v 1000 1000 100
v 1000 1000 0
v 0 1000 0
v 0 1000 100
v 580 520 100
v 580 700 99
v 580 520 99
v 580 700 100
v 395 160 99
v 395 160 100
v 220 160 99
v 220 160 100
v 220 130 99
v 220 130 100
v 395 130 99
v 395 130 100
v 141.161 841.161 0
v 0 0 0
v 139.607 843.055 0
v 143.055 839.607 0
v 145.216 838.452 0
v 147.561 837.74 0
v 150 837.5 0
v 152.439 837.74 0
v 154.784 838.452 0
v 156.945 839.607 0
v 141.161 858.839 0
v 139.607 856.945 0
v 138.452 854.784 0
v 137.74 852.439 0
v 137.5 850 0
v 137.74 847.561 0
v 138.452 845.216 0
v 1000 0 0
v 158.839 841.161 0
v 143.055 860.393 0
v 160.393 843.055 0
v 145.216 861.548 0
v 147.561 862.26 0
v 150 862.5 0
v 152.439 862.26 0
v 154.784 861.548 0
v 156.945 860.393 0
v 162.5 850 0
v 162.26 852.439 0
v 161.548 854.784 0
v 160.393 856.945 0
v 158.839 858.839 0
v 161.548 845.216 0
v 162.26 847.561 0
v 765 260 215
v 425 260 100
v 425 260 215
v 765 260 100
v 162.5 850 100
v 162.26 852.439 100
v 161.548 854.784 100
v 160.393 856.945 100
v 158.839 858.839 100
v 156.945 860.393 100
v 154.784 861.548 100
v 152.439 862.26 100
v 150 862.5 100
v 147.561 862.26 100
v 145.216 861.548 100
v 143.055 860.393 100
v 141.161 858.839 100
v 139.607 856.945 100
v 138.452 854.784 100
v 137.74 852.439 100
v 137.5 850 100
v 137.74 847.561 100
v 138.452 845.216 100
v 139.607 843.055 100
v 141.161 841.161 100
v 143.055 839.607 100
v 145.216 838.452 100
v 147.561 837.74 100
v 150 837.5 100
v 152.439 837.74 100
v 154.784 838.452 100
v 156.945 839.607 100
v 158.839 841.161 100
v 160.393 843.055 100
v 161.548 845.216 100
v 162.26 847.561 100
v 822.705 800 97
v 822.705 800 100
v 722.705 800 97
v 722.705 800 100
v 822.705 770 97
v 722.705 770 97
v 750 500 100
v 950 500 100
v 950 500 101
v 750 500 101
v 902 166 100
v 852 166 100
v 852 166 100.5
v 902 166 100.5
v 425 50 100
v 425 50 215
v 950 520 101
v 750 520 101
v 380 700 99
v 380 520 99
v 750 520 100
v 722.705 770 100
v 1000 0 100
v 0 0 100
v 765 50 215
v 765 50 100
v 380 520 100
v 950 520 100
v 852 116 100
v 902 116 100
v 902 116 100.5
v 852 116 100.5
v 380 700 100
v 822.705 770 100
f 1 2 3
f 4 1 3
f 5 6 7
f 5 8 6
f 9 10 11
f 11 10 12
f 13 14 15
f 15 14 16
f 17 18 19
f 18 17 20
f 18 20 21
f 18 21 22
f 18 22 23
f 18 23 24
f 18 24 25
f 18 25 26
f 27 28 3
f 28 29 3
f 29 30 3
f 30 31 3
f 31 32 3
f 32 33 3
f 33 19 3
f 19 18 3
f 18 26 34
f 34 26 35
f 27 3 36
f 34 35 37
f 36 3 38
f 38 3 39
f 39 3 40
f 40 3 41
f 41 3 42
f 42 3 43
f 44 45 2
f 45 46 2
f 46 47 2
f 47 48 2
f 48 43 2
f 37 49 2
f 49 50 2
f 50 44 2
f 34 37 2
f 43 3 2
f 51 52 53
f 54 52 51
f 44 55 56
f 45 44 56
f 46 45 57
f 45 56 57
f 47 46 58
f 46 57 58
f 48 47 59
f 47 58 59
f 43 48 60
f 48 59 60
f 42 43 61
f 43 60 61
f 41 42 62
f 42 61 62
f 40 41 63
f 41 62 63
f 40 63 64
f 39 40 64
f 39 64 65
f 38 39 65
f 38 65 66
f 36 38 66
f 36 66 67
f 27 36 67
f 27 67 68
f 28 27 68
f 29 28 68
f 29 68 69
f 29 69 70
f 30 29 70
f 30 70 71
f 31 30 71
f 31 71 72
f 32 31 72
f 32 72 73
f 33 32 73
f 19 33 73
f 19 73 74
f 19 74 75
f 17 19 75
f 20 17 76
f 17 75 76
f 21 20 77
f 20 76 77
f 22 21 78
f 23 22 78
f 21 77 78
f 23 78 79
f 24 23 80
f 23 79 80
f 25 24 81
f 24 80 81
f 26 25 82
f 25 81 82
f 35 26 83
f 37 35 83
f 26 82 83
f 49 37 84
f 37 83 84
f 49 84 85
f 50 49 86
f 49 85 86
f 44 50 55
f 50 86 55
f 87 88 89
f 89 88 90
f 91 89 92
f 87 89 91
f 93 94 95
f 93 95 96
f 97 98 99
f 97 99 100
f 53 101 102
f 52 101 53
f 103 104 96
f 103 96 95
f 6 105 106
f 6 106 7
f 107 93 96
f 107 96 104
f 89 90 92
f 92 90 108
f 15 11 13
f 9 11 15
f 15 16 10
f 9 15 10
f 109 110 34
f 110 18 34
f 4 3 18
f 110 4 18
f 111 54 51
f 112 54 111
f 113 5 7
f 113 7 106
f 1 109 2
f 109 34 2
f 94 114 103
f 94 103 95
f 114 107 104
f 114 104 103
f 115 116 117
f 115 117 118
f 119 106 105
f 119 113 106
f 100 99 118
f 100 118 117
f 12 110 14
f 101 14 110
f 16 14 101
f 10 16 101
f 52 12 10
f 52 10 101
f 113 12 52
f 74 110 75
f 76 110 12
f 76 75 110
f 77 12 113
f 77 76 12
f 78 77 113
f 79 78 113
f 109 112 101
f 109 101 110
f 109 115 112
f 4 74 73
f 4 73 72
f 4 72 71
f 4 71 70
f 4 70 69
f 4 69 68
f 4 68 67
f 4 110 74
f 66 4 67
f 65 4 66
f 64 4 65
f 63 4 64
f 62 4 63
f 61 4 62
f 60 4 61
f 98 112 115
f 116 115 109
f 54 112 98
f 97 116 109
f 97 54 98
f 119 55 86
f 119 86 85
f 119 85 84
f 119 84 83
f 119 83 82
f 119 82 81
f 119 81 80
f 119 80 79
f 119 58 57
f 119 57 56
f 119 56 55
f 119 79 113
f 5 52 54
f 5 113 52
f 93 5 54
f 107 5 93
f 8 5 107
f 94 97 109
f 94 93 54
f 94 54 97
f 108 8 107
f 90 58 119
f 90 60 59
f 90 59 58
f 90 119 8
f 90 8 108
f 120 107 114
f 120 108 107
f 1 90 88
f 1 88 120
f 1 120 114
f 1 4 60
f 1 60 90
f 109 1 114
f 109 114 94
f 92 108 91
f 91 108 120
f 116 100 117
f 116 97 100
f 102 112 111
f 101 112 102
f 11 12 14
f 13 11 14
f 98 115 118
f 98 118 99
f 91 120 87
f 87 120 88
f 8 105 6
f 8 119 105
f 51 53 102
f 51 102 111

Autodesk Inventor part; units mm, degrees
sketch "Sketch1" plane through (0, 0, 0) normal (0, 0, 1) x (1, 0, 0)
  line L0 (0, 0) -> (1000, 0)
  line L1 (1000, 0) -> (1000, 1000)
  line L2 (1000, 1000) -> (0, 1000)
  line L3 (0, 1000) -> (0, 0)
  dimension "d0" = 1000
  dimension "d1" = 1000
extrude "Extrusion1" add sketch "Sketch1" along normal blind 100
sketch "Sketch8" plane through (0, 0, 100) normal (0, 0, 1) x (1, 0, 0)
  line L0 (1000, 1000) -> (0, 1000) projected
  line L1 (0, 1000) -> (150, 1000)
  line L2 (150, 1000) -> (150, 850)
  circle A0 centre (150, 850) radius 12.5
  point P0 (0, 0)
  dimension "d30" = 150
  dimension "d31" = 150
  dimension "d32" = 25
extrude "Extrusion4" cut sketch "Sketch8" against normal blind 100
sketch "Sketch9" plane through (0, 0, 100) normal (0, 0, 1) x (1, 0, 0)
  line L0 (425, 260) -> (765, 260)
  line L1 (765, 260) -> (765, 50)
  line L2 (765, 50) -> (425, 50)
  line L3 (425, 50) -> (425, 260)
  line L4 (0, 0) -> (1000, 0) projected
  line L5 (0, 1000) -> (0, 0) projected
  dimension "d35" = 210
  dimension "d36" = 340
  dimension "d37" = 50
extrude "Extrusion5" add sketch "Sketch9" along normal blind 115
ref_plane "Work Plane6" through (1000, 0, 0) normal (1, 0, 0) x (0, 0, -1)
ref_plane "Work Plane7" through (0, 775, 0) normal (0, 1, 0) x (1, 0, 0)
sketch "Sketch12" plane through (0, 0, 100) normal (0, 0, 1) x (1, 0, 0)
  line L0 (0, 0) -> (1000, 0) projected
  line L1 (877, 141) -> (742, 141) construction
  line L2 (877, 141) -> (877, 166) construction
  line L3 (902, 166) -> (902, 116)
  line L4 (902, 116) -> (852, 116)
  line L5 (852, 116) -> (852, 166)
  line L6 (852, 166) -> (902, 166)
  dimension "d58" = 25
  dimension "d59" = 50
  dimension "d60" = 50
  dimension "d63" = 25
  dimension "d64" = 25
extrude "Extrusion8" add sketch "Sketch12" along normal blind 0.5
ref_plane "Work Plane8" through (0, 237, 0) normal (0, -1, 0) x (1, 0, 0)
sketch "Sketch13" plane through (0, 0, 100) normal (0, 0, 1) x (1, 0, 0)
  line L0 (425, 260) -> (425, 50) projected
  line L1 (425, 155) -> (395, 155)
  line L2 (395, 155) -> (395, 160)
  line L3 (395, 160) -> (220, 160)
  line L4 (220, 160) -> (220, 130)
  line L5 (220, 130) -> (395, 130)
  line L6 (395, 130) -> (395, 155)
  line L7 (425, 50) -> (164, 50)
  point P0 (0, 0)
  dimension "d67" = 30
  dimension "d68" = 5
  dimension "d69" = 175
  dimension "d73" = 80
extrude "Extrusion9" cut sketch "Sketch13" against normal blind 1
sketch "Sketch14" plane through (0, 0, 100) normal (0, 0, 1) x (1, 0, 0)
  line L0 (580, 520) -> (380, 520)
  line L1 (380, 520) -> (380, 700)
  line L2 (380, 700) -> (580, 700)
  line L3 (580, 700) -> (580, 520)
  line L4 (0, 1000) -> (0, 0) projected
  line L5 (1000, 1000) -> (0, 1000) projected
  point P0 (380, 610)
  dimension "d74" = 180
  dimension "d75" = 200
  dimension "d76" = 380
  dimension "d77" = 300
extrude "Extrusion10" cut sketch "Sketch14" against normal blind 1
sketch "Sketch16" plane through (0, 0, 100) normal (0, 0, 1) x (1, 0, 0)
  line L0 (722.7051, 770) -> (822.7051, 770)
  line L1 (822.7051, 770) -> (822.7051, 800)
  line L2 (822.7051, 800) -> (722.7051, 800)
  line L3 (722.7051, 800) -> (722.7051, 770)
  line L4 (1000, 1000) -> (0, 1000) projected
  point P0 (0, 0)
  dimension "d86" = 100
  dimension "d87" = 30
  dimension "d90" = 200
extrude "Extrusion12" cut sketch "Sketch16" against normal blind 3
sketch "Sketch18" plane through (0, 0, 100) normal (0, 0, 1) x (1, 0, 0)
  line L0 (950, 500) -> (750, 500)
  line L1 (750, 500) -> (750, 520)
  line L2 (750, 520) -> (950, 520)
  line L3 (950, 520) -> (950, 500)
  line L4 (1000, 0) -> (1000, 1000) projected
  line L5 (0, 0) -> (1000, 0) projected
  dimension "d93" = 20
  dimension "d94" = 50
  dimension "d95" = 500
  dimension "d96" = 200
extrude "Extrusion14" add sketch "Sketch18" along normal blind 1
properties part number "Base"
